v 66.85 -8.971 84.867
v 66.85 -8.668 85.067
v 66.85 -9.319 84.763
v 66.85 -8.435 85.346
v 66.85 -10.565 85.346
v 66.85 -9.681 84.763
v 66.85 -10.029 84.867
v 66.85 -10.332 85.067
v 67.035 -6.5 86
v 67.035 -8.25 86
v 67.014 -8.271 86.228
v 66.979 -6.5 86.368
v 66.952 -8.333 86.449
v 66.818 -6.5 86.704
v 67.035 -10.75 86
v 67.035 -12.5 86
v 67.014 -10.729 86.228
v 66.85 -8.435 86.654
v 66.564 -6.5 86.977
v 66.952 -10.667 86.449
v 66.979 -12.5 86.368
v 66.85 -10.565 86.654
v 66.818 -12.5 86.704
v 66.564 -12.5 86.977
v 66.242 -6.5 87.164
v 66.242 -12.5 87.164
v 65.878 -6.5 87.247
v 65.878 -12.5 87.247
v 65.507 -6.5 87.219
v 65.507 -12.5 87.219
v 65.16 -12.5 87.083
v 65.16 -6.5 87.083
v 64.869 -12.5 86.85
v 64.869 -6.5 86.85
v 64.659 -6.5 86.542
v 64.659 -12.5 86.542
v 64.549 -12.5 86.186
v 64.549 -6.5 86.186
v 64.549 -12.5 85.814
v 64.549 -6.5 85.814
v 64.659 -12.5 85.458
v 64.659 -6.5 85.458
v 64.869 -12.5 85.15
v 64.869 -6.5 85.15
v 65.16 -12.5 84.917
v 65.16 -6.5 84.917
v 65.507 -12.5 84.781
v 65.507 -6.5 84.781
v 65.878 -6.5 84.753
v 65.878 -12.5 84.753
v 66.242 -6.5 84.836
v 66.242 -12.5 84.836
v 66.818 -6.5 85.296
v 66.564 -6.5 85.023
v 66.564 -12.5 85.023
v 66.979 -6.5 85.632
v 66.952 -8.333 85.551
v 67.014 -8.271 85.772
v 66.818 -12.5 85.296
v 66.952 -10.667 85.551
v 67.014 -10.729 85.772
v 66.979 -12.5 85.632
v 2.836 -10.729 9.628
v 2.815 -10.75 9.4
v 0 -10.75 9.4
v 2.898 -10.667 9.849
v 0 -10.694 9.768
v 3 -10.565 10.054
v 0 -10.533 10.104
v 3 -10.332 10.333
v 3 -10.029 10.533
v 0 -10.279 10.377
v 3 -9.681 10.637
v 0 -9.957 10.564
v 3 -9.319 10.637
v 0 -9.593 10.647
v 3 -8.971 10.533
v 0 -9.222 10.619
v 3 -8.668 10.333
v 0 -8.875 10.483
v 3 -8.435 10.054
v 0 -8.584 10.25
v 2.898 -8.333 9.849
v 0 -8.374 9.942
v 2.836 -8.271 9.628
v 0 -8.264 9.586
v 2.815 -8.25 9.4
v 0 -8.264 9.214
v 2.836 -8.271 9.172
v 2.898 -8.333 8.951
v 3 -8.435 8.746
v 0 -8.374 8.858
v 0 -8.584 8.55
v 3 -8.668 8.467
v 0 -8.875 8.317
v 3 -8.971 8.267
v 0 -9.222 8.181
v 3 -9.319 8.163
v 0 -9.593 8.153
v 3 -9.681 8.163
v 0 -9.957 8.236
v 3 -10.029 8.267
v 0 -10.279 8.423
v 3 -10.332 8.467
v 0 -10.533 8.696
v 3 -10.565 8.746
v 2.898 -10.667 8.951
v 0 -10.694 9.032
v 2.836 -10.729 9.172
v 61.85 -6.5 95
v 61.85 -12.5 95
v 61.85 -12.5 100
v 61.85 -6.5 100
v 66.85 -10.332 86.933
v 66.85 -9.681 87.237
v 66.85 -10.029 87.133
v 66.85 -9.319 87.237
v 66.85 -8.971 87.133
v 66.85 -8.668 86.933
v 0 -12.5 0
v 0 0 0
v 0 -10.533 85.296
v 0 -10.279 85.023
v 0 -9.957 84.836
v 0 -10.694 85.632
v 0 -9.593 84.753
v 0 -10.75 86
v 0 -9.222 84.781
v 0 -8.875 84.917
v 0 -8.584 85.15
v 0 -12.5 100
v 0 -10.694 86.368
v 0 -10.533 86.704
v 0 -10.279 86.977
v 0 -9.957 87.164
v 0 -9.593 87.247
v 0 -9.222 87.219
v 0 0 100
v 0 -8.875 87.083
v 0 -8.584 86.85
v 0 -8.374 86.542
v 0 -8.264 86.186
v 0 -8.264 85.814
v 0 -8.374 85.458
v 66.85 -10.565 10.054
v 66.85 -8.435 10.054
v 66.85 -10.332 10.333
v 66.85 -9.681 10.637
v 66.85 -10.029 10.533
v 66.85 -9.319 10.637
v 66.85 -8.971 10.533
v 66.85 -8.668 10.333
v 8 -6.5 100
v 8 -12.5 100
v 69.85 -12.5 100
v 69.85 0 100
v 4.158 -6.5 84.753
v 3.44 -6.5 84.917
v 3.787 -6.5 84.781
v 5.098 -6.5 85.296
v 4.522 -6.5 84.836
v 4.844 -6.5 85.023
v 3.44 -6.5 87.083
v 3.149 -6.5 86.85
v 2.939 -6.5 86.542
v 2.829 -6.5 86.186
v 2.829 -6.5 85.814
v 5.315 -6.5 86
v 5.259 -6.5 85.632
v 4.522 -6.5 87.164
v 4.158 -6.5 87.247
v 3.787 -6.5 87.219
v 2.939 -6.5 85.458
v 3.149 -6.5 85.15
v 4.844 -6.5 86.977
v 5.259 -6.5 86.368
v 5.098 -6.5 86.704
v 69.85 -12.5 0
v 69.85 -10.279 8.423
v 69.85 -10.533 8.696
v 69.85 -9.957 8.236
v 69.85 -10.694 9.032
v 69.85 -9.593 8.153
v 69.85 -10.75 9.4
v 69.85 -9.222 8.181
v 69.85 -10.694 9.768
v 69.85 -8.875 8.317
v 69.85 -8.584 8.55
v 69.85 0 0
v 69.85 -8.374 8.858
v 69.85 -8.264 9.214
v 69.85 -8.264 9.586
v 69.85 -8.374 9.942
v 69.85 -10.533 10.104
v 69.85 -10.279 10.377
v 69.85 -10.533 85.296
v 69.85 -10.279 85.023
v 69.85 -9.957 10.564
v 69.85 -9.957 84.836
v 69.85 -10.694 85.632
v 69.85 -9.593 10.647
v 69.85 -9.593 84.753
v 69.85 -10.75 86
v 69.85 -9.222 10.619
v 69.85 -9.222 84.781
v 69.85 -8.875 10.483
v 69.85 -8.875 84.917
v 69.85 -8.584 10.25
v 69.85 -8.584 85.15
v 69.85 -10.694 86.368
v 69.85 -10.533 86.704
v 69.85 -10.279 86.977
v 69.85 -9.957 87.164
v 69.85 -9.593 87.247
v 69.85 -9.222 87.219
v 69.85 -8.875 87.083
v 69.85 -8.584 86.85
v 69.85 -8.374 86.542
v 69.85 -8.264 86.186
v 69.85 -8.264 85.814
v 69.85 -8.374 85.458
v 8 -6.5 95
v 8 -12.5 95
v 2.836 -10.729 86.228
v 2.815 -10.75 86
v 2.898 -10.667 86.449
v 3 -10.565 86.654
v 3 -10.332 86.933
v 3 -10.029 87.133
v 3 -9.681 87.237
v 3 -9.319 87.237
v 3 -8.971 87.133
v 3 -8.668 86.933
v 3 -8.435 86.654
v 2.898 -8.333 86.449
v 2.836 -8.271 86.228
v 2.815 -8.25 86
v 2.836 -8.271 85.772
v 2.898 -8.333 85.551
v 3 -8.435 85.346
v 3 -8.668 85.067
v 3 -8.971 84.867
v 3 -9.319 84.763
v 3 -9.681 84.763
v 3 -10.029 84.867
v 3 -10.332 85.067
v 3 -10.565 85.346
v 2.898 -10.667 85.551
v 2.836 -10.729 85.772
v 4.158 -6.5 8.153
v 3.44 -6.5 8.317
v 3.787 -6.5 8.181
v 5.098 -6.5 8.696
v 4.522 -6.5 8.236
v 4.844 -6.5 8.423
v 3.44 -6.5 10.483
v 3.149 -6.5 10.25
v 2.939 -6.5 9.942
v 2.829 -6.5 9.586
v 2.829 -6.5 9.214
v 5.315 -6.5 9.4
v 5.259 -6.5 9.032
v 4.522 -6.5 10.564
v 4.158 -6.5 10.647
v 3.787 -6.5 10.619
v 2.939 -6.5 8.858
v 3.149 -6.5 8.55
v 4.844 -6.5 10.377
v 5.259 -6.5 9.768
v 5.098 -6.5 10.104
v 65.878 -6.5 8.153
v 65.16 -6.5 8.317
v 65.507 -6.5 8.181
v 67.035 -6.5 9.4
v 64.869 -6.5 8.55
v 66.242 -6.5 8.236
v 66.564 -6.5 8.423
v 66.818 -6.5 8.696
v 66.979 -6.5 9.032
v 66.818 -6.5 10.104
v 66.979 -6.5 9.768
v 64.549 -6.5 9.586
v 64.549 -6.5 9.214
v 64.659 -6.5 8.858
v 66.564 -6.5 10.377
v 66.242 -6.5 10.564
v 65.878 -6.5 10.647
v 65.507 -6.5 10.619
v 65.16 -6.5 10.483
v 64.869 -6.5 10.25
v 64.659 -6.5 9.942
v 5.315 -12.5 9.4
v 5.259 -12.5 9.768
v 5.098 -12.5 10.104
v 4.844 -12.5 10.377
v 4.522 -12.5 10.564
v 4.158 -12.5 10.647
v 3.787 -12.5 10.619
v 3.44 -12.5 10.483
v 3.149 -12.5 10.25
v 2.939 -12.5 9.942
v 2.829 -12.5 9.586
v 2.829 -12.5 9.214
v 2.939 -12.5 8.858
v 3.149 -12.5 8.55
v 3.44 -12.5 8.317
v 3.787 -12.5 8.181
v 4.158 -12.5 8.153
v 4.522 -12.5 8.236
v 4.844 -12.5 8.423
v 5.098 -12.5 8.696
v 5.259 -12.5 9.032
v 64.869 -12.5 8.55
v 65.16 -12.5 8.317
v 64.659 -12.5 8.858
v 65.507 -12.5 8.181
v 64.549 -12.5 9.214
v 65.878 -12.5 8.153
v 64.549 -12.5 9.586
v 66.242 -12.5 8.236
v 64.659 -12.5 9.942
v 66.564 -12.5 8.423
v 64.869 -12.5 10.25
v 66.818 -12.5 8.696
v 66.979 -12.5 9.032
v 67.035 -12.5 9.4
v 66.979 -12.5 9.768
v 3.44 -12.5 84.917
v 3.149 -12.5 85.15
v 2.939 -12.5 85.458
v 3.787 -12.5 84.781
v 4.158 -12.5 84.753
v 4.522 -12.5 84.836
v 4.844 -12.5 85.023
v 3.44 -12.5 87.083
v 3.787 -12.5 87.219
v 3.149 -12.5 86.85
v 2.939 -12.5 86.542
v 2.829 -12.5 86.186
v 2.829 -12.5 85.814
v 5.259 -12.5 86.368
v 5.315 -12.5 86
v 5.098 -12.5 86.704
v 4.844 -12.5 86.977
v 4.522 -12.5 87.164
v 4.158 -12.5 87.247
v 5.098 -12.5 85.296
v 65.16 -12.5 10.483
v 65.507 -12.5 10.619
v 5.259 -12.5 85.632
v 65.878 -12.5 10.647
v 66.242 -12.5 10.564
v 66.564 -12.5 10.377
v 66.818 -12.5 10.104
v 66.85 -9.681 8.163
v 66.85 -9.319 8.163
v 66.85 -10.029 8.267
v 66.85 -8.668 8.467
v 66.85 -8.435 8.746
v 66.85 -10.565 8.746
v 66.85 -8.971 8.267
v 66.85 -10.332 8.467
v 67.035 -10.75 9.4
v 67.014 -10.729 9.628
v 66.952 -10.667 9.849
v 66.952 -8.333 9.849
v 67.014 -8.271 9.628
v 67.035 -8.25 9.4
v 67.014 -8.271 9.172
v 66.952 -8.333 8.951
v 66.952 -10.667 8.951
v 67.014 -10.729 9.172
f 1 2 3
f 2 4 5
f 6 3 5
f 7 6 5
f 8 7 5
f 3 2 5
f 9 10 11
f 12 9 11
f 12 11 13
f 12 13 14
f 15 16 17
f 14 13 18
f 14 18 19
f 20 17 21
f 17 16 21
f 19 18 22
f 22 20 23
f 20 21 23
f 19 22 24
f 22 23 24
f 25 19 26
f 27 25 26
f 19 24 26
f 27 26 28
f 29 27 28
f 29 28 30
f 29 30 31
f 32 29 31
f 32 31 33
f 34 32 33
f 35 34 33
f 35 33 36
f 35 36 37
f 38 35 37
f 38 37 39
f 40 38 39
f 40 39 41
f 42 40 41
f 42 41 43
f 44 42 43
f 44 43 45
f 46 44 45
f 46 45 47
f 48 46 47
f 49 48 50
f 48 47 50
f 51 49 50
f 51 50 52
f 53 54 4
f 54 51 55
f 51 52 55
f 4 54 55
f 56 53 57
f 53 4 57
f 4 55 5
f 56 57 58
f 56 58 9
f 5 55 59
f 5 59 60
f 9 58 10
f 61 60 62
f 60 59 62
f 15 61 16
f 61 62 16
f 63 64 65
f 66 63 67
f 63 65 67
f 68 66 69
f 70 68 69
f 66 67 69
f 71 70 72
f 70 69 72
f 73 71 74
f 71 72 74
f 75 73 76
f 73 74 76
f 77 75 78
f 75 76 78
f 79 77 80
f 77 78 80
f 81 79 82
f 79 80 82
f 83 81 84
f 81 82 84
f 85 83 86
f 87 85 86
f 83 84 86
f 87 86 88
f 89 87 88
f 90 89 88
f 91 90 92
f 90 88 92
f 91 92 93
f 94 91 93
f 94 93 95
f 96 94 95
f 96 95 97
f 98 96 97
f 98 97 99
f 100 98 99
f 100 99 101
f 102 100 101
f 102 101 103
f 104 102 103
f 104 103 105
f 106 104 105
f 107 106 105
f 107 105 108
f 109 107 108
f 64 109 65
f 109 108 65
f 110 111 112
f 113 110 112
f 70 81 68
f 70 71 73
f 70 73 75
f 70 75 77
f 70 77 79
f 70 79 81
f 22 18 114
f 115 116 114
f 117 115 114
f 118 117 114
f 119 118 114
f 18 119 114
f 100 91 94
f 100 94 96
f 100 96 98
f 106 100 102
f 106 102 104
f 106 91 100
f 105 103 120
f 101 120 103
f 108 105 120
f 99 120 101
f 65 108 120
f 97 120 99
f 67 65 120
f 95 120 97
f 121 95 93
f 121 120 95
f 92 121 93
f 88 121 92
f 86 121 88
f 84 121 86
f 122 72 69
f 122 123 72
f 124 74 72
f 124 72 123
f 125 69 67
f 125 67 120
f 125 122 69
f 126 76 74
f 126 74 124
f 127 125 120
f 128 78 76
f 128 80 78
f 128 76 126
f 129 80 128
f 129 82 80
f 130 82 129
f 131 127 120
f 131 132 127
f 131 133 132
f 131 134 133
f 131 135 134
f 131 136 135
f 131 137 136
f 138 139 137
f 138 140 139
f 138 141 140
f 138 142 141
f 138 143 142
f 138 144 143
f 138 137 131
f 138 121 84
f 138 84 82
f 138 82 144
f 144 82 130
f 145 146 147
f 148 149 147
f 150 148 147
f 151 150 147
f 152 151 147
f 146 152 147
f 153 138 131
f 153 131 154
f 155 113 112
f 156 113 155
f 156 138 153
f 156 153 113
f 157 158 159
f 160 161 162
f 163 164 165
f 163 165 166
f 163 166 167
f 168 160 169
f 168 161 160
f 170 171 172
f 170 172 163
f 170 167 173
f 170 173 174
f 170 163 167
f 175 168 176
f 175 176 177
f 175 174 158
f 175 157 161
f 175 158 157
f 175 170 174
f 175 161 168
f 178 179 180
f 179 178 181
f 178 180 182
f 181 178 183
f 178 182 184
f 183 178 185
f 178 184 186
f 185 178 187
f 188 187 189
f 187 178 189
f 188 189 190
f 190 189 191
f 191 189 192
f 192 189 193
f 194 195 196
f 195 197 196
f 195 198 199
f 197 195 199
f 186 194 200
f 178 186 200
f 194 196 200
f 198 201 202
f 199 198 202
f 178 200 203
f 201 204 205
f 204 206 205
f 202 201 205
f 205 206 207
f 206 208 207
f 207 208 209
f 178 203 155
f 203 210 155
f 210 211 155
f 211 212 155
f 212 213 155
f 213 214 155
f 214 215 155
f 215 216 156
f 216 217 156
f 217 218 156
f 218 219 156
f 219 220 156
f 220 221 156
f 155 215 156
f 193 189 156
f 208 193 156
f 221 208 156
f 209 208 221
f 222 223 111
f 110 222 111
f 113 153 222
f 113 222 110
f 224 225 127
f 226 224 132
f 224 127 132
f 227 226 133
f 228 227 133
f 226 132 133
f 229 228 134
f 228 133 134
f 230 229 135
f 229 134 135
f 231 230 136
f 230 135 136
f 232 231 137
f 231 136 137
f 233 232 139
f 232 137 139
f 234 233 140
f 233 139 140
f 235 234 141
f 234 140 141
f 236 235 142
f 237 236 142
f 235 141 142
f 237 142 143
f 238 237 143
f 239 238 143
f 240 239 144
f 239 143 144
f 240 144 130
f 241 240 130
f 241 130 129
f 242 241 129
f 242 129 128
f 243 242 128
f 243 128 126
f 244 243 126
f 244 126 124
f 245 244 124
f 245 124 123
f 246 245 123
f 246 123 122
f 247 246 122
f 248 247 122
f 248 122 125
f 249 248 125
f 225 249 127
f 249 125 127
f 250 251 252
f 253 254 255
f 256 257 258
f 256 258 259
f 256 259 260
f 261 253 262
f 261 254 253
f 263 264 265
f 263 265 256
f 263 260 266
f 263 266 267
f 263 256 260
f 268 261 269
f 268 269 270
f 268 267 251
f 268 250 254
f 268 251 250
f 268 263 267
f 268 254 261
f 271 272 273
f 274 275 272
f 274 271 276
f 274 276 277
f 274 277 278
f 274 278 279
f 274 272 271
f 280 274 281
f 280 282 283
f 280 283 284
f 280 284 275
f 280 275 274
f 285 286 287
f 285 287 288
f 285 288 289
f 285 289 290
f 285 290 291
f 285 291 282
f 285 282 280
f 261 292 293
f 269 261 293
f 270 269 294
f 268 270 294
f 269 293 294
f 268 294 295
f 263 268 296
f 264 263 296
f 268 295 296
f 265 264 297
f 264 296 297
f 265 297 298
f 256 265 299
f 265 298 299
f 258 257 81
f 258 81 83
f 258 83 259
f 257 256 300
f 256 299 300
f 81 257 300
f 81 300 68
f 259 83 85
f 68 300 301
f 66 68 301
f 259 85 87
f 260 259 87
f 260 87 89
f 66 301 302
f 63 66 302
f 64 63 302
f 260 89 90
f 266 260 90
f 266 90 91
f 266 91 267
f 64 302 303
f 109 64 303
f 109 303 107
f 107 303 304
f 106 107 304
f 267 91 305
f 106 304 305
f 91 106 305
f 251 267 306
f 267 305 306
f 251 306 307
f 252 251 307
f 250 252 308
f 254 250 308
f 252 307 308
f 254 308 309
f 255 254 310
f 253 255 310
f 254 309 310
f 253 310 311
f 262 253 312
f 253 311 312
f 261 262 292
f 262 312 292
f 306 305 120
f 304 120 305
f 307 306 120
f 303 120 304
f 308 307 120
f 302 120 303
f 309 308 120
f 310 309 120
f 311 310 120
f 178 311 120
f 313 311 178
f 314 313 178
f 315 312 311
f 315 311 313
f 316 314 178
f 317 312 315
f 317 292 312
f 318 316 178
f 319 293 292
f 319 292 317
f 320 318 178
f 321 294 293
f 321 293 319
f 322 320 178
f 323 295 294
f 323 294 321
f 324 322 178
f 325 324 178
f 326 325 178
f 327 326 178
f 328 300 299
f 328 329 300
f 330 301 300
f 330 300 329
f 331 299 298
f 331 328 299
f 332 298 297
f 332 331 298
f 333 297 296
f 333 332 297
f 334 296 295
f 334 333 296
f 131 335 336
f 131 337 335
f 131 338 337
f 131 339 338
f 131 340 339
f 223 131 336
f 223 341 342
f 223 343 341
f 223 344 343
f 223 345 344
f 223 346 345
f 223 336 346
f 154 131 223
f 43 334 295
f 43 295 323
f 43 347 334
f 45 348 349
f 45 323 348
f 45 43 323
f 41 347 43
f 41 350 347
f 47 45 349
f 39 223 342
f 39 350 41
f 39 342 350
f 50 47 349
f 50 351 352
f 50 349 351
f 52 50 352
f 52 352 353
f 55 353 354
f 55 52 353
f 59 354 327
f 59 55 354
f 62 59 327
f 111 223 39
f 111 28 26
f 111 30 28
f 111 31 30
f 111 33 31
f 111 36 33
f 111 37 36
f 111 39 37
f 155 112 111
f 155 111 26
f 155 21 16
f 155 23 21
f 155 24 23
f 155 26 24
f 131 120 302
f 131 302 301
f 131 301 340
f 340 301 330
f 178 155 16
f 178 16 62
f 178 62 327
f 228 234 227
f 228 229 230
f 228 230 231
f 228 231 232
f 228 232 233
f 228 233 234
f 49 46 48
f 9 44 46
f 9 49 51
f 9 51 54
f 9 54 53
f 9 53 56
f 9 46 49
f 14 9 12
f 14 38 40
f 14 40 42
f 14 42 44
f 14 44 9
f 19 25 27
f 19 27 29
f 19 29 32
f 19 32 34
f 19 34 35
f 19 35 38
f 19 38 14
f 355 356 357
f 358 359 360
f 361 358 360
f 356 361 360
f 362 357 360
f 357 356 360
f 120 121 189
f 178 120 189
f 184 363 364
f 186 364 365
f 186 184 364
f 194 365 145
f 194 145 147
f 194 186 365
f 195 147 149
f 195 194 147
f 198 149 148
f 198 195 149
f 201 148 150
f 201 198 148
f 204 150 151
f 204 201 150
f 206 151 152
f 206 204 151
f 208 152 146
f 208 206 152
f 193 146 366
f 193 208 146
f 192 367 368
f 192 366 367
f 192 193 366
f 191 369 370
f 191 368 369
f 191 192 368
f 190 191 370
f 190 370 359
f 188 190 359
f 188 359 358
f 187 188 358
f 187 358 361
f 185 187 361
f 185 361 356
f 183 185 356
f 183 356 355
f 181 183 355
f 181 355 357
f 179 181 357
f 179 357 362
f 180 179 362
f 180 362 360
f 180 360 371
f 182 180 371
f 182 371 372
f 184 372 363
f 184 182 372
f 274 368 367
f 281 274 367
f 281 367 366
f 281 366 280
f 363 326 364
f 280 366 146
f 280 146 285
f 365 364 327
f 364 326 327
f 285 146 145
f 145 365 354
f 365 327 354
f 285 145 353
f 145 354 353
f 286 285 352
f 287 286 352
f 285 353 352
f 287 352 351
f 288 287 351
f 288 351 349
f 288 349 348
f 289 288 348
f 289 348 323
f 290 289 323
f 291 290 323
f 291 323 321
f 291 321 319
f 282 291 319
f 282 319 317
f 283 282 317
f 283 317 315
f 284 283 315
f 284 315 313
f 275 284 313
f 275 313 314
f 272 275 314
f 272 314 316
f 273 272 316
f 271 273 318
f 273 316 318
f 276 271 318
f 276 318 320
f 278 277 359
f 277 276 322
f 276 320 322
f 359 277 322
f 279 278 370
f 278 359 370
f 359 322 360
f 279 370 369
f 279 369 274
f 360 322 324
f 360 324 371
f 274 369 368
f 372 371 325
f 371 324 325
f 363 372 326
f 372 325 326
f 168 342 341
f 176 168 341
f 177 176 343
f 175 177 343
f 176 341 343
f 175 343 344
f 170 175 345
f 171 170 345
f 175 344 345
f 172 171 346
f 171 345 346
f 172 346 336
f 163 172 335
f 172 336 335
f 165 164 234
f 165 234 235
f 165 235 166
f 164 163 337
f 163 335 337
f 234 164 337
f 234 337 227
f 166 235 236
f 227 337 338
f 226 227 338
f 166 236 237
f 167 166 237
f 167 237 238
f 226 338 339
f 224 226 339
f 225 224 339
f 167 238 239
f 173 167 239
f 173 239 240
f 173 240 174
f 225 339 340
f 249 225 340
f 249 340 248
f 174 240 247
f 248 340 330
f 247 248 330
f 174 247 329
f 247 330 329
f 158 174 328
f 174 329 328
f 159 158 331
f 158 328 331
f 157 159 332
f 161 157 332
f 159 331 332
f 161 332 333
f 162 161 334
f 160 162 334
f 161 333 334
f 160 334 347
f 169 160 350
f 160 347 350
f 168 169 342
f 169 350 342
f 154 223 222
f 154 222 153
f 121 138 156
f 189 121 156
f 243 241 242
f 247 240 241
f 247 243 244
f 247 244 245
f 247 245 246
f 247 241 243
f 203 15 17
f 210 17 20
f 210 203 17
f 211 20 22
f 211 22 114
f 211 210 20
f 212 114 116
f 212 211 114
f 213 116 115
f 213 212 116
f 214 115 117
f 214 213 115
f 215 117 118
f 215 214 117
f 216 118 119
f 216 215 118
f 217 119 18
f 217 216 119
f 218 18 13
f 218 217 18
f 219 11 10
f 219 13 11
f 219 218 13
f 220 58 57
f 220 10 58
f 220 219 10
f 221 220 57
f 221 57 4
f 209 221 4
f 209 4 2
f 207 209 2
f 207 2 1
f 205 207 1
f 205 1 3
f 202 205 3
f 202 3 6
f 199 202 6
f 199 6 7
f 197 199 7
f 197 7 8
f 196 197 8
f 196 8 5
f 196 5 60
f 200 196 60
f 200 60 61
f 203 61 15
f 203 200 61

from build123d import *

# Parameters (mm, degrees)
F0_W     = 69.85
F0_H     = 100
F1_DEPTH = 12.5
F2_R     = 1.25
F2_W     = 53.85
F2_H     = 5
F3_DEPTH = 6
F4_R     = 1.25
F5_DEPTH = 3


# Not quite as in the source:
# - a pattern or mirror of a feature is missing from the dataset's text; its kind, count and spacing are read off the source's solid


with BuildPart() as f1:
    # F0 (on Front) → F1 (new body)
    with BuildSketch(Plane.XZ):
        with Locations((34.925, 50)):
            Rectangle(F0_W, F0_H)
    extrude(amount=F1_DEPTH)

    # F2 (on face) → F3 (cut)
    with BuildSketch(Plane.XZ.offset(12.5)):
        with Locations((4.065, 9.4)):
            Circle(F2_R)
        with Locations((4.065, 86)):
            Circle(F2_R)
        with Locations((65.785, 9.4)):
            Circle(F2_R)
        with Locations((65.785, 86)):
            Circle(F2_R)
        with Locations((34.925, 97.5)):
            Rectangle(F2_W, F2_H)
    extrude(amount=-F3_DEPTH, mode=Mode.SUBTRACT)

    # F4 (on face) → F5 (cut)
    with BuildSketch(Plane(origin=(0, 0, 0), x_dir=(0, -1, 0), z_dir=(-1, 0, 0))):
        with Locations((9.5, 86)):
            Circle(F4_R)
        with Locations((9.5, 9.4)):
            Circle(F4_R)
    f5 = extrude(amount=-F5_DEPTH, mode=Mode.SUBTRACT)

    # F5_copies: F5 across plane
    add(f5.mirror(Plane(origin=(34.925, 0, 0), x_dir=(0, 0, 1), z_dir=(1, 0, 0))), mode=Mode.SUBTRACT)


solid = f1.part
